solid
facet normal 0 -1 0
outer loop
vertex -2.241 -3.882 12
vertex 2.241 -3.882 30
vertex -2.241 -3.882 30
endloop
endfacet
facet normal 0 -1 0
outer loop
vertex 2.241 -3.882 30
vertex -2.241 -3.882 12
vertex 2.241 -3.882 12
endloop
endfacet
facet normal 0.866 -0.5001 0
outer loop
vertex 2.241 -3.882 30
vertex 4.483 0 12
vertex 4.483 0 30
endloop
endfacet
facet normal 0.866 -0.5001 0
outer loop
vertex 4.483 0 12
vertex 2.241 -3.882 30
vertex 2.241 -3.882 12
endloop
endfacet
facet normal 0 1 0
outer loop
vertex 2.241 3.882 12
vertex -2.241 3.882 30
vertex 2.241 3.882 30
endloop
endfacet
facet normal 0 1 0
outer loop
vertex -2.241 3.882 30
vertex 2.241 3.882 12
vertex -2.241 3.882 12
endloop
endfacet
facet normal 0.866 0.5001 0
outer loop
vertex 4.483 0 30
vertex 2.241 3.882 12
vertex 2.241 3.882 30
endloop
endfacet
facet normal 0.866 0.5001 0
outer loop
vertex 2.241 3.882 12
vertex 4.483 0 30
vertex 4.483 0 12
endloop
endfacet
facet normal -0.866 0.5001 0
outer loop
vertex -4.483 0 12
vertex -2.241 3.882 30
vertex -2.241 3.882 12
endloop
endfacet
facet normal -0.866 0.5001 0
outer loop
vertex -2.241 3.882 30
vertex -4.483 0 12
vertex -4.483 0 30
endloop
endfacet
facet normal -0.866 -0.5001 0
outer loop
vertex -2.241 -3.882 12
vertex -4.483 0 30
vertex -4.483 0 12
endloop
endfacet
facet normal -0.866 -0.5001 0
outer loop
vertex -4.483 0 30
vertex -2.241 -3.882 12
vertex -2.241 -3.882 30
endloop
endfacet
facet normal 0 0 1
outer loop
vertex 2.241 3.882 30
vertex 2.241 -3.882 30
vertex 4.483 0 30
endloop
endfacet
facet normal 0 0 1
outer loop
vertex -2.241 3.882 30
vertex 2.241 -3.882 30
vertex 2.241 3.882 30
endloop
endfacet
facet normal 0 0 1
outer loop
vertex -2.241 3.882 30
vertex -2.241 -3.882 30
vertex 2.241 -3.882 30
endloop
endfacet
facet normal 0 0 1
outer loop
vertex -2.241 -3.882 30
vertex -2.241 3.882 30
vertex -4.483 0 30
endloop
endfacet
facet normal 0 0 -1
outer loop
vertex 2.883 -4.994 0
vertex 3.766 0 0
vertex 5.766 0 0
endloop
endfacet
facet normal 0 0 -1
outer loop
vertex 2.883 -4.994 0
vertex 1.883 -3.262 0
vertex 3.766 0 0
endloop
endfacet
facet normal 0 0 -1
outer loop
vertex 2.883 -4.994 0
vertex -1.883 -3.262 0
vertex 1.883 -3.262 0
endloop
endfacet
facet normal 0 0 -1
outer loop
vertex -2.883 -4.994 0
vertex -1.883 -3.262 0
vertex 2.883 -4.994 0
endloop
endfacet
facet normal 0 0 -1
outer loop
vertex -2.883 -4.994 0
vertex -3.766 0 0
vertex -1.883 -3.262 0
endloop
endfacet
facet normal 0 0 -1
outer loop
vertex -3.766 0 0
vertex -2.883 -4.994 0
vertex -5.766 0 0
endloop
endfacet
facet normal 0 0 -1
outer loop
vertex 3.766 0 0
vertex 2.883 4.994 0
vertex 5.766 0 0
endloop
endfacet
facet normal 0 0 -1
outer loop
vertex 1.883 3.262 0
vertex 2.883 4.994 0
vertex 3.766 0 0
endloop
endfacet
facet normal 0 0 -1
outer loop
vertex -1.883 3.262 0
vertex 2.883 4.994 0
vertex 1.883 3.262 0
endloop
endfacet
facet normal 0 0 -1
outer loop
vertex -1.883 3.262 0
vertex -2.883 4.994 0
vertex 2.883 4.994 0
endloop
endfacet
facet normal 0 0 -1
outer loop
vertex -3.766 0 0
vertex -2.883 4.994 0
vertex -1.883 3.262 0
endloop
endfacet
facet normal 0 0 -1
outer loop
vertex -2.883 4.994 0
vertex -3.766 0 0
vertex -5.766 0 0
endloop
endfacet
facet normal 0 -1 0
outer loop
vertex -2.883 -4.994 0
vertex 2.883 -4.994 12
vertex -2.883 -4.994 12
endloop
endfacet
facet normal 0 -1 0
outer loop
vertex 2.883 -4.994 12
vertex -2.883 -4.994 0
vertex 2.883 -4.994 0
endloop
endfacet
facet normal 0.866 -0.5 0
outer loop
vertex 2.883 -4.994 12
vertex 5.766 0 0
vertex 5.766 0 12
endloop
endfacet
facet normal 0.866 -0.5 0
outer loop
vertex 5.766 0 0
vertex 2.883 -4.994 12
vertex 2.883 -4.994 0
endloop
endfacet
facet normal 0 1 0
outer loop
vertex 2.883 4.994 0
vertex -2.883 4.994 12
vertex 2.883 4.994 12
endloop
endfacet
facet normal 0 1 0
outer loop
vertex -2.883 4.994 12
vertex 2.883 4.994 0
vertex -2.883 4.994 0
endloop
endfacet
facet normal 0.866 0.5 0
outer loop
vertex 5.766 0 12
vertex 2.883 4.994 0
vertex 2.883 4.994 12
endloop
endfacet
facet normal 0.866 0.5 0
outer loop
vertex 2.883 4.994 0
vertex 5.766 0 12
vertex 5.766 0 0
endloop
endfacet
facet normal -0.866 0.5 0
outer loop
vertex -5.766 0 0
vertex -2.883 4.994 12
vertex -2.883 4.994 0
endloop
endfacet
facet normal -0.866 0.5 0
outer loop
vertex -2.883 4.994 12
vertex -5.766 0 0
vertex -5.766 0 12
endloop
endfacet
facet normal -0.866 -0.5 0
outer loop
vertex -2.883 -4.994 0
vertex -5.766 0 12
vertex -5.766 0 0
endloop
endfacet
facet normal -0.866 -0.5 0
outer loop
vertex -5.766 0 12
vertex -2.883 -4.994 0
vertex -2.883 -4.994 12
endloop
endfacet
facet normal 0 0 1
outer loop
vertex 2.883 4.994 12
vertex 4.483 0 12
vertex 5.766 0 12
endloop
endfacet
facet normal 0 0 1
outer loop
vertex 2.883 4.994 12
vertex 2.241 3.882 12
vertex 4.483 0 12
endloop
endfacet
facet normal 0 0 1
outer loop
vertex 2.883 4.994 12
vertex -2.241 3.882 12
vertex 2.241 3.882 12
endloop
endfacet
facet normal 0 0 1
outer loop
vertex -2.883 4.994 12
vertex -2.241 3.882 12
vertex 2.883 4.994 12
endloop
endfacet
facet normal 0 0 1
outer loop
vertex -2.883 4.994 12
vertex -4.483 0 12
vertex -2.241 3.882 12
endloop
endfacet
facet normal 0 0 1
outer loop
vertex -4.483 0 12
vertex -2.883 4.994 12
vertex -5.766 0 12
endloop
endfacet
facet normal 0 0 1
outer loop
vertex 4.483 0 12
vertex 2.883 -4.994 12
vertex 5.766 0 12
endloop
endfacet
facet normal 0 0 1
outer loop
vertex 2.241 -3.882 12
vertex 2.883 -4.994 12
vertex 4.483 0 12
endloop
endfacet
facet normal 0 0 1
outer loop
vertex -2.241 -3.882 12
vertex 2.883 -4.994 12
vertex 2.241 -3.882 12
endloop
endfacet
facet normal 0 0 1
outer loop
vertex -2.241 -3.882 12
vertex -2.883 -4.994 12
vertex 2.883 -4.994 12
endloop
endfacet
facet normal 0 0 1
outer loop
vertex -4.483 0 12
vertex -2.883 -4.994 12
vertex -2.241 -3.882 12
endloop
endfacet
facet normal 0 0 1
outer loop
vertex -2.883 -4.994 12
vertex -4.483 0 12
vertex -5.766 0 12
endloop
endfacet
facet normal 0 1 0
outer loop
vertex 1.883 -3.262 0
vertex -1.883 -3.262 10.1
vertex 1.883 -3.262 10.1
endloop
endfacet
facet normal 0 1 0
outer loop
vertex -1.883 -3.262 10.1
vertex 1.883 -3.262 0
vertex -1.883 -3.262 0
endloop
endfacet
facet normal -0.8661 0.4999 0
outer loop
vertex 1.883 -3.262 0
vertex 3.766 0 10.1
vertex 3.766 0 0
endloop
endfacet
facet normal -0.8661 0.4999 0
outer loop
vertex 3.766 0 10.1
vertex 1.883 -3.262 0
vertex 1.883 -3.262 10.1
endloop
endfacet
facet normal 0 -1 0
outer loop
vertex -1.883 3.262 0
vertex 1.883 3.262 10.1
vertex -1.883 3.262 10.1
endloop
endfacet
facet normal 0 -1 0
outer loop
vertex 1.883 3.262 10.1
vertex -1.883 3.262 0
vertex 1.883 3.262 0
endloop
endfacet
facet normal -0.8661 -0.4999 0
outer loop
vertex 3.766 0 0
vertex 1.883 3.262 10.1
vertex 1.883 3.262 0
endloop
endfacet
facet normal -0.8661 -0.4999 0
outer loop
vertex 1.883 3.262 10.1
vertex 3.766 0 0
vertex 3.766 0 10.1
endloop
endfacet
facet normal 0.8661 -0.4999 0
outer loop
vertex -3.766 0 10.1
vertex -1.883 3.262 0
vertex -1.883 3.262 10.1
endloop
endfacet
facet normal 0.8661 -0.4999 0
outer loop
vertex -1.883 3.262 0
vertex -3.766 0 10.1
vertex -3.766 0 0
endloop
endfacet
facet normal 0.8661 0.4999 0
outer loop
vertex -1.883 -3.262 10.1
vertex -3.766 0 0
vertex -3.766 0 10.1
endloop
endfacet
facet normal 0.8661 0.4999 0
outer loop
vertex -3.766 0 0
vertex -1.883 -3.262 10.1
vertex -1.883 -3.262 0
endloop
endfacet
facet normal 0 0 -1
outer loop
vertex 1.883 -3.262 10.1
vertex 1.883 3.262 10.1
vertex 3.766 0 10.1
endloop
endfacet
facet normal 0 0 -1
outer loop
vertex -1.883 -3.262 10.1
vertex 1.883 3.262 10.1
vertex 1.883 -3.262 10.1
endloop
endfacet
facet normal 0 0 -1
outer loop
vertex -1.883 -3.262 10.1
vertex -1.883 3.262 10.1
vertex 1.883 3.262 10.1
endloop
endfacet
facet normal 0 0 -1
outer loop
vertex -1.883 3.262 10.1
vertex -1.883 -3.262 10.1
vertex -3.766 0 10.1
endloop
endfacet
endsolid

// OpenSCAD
adapter_length = 30;
hole_depth = 10;
hole_wall_thickness = 2;
// outer diameter of plug across the flats: 5/16 * 25.4
plug_od = 7.9375; 
// diameter of hole across the flats: 1/4 * 25.4
hole_diameter = 6.35; 
clearance = 0.1;

difference() {
  union() {
    cylinder(h=adapter_length, r=plug_od/sqrt(3) - clearance, $fn = 6);
    cylinder(h=hole_depth + hole_wall_thickness, r=hole_diameter/sqrt(3) + clearance + hole_wall_thickness, $fn = 6);
  }
  translate([0, 0, -clearance]) cylinder(h=hole_depth + 2*clearance, r=hole_diameter/sqrt(3) + clearance, $fn = 6);
}
